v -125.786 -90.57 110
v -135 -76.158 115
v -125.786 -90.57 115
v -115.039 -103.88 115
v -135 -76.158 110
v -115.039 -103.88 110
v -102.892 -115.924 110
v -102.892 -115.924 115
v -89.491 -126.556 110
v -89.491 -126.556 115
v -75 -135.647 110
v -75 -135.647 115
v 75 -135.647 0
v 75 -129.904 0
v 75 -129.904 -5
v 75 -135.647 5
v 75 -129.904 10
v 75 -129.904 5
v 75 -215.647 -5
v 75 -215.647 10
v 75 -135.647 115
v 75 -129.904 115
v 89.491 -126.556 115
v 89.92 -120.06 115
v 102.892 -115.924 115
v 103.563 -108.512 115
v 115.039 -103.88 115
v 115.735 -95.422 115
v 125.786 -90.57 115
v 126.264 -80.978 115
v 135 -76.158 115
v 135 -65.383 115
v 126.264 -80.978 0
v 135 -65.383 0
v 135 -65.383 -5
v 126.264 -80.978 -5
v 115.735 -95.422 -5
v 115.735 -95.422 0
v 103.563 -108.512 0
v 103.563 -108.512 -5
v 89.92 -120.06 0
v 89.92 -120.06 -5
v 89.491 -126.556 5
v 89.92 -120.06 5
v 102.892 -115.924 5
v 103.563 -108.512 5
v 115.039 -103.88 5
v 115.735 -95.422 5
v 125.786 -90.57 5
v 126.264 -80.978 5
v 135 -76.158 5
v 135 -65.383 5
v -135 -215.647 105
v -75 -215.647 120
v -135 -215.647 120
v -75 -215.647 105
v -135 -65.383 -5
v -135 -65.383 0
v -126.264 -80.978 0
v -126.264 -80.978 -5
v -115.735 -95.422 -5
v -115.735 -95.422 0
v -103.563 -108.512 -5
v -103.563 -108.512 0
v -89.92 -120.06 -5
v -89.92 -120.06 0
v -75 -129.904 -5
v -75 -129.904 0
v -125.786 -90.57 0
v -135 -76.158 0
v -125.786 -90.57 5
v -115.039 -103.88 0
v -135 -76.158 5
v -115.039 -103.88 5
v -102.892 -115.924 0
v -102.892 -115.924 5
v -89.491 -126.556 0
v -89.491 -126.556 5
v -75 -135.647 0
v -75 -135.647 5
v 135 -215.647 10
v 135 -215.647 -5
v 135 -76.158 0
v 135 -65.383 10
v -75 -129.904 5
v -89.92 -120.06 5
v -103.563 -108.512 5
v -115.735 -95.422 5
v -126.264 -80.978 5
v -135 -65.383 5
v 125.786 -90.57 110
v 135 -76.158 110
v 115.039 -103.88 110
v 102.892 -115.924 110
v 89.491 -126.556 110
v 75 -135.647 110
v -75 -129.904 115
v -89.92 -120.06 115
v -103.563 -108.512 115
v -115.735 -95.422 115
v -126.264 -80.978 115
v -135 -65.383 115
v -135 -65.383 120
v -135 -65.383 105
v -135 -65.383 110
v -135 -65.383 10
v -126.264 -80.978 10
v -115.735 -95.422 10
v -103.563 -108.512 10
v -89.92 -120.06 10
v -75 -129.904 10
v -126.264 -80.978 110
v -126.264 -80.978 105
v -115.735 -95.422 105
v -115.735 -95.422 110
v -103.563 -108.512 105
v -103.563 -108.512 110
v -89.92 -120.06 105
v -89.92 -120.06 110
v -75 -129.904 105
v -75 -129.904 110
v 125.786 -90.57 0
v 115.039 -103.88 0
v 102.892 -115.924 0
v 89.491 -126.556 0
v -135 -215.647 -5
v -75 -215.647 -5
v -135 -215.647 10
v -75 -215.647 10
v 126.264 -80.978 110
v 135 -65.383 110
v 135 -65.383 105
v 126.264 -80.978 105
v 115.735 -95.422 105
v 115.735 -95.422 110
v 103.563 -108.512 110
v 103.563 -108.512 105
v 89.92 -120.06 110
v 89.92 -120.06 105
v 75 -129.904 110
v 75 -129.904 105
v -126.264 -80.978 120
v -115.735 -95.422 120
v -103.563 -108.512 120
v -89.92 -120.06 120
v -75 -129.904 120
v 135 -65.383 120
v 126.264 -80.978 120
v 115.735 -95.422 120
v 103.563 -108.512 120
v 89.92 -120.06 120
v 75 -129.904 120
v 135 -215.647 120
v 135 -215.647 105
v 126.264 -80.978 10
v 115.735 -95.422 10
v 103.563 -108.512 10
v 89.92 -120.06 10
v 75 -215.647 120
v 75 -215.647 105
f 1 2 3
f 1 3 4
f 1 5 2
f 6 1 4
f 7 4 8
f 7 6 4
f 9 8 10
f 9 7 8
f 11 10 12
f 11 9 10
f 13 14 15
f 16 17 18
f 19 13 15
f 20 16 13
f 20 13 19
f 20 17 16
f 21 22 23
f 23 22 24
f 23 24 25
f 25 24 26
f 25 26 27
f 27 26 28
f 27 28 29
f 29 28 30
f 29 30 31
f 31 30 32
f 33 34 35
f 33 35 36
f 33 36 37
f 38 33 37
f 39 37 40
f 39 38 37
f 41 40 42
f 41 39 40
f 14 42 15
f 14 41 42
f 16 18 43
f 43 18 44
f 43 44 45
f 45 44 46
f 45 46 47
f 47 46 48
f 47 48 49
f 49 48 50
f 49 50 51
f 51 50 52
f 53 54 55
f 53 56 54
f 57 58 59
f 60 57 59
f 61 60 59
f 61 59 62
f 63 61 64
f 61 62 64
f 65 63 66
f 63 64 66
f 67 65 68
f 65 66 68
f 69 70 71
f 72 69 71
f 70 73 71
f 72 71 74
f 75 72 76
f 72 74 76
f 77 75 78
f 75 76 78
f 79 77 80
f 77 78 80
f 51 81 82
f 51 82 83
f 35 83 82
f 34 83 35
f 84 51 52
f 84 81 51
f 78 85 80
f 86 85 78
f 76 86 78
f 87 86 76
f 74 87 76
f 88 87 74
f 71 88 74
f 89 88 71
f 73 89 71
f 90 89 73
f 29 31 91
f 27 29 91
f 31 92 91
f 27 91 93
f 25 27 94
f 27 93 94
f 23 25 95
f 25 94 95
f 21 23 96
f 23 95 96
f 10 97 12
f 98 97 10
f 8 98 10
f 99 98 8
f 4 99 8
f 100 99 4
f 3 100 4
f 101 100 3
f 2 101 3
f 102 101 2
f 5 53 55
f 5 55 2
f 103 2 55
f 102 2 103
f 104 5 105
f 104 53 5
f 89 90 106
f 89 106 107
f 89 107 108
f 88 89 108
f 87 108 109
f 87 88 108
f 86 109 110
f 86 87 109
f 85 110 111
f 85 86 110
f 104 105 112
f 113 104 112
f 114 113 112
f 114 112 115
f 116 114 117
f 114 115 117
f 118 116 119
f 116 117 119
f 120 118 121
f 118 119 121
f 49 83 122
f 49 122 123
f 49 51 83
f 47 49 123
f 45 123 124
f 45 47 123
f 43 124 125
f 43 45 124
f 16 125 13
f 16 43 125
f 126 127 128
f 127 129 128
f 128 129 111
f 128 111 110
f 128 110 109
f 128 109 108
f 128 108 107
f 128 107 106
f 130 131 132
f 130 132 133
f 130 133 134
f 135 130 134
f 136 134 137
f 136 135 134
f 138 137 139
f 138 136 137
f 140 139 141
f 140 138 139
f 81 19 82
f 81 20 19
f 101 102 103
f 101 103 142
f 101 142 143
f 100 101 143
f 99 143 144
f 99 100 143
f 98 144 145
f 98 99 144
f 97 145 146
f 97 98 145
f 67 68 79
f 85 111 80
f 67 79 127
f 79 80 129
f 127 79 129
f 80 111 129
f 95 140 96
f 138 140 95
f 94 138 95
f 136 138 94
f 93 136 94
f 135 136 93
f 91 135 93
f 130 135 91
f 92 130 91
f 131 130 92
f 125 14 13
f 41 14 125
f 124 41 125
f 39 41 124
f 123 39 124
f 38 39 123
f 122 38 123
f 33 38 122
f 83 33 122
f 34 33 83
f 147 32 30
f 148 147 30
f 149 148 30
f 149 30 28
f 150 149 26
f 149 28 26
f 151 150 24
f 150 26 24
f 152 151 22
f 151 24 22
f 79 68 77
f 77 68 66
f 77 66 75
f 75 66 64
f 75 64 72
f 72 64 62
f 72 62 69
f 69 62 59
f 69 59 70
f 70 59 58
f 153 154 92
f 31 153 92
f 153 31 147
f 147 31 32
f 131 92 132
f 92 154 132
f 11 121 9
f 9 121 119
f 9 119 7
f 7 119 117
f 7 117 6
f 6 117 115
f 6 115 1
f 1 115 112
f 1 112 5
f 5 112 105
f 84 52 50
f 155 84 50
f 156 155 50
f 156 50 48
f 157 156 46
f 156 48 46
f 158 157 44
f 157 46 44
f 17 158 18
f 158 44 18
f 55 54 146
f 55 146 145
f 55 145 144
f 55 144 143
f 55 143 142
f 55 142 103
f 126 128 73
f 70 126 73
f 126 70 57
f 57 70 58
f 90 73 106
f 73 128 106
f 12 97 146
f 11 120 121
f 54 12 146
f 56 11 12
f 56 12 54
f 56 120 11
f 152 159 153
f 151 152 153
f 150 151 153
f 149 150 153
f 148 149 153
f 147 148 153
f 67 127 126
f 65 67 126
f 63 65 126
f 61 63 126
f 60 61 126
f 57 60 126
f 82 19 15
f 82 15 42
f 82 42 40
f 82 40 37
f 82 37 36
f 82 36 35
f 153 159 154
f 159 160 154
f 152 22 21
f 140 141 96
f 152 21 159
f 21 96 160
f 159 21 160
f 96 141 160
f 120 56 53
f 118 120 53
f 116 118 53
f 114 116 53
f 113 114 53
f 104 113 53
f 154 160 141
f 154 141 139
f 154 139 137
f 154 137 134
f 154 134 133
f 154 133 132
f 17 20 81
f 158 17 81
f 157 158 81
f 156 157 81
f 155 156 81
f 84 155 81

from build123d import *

# Parameters (mm, degrees)
BOSS_EXTRUDE4_DEPTH = 2.5
BOSS_EXTRUDE5_DEPTH = 5


with BuildPart() as part:
    # Sketch7 → Boss-Extrude4 (new, symmetric)
    with BuildSketch(Plane.XY.offset(2.5)):
        with BuildLine():
            Line((75, -135.646599663), (75, -215.646599663))
            Line((75, -215.646599663), (135, -215.646599663))
            Line((135, -215.646599663), (135, -76.157731059))
            ThreePointArc((135, -76.157731059), (109.131715701, -110.069380974), (75, -135.646599663))
        make_face()
    extrude(amount=BOSS_EXTRUDE4_DEPTH, both=True)

    # Sketch8 → Boss-Extrude5 (add)
    with BuildSketch(Plane.XY.offset(5)):
        with BuildLine():
            Line((75, -215.646599663), (135, -215.646599663))
            Line((135, -215.646599663), (135, -65.383484153))
            ThreePointArc((135, -65.383484153), (109.84406279, -102.148332683), (75, -129.903810568))
            Line((75, -129.903810568), (75, -215.646599663))
        make_face()
    boss_extrude5 = extrude(amount=BOSS_EXTRUDE5_DEPTH)

    # Mirror1: Boss-Extrude5 across plane
    add(boss_extrude5.mirror(Plane.XY.offset(2.5)))


with BuildPart() as body_2:
    # Mirror2: mirrored copy
    add(part.part.mirror(Plane(origin=(0, 0, 0), x_dir=(0, 0, 1), z_dir=(1, 0, 0))))


with BuildPart() as body_3:
    # Mirror3: mirrored copy
    add(part.part.mirror(Plane.XY.offset(57.5)))


with BuildPart() as body_4:
    # Mirror3 2: mirrored copy
    add(body_2.part.mirror(Plane.XY.offset(57.5)))


solid = Compound([part.part, body_2.part, body_3.part, body_4.part])
